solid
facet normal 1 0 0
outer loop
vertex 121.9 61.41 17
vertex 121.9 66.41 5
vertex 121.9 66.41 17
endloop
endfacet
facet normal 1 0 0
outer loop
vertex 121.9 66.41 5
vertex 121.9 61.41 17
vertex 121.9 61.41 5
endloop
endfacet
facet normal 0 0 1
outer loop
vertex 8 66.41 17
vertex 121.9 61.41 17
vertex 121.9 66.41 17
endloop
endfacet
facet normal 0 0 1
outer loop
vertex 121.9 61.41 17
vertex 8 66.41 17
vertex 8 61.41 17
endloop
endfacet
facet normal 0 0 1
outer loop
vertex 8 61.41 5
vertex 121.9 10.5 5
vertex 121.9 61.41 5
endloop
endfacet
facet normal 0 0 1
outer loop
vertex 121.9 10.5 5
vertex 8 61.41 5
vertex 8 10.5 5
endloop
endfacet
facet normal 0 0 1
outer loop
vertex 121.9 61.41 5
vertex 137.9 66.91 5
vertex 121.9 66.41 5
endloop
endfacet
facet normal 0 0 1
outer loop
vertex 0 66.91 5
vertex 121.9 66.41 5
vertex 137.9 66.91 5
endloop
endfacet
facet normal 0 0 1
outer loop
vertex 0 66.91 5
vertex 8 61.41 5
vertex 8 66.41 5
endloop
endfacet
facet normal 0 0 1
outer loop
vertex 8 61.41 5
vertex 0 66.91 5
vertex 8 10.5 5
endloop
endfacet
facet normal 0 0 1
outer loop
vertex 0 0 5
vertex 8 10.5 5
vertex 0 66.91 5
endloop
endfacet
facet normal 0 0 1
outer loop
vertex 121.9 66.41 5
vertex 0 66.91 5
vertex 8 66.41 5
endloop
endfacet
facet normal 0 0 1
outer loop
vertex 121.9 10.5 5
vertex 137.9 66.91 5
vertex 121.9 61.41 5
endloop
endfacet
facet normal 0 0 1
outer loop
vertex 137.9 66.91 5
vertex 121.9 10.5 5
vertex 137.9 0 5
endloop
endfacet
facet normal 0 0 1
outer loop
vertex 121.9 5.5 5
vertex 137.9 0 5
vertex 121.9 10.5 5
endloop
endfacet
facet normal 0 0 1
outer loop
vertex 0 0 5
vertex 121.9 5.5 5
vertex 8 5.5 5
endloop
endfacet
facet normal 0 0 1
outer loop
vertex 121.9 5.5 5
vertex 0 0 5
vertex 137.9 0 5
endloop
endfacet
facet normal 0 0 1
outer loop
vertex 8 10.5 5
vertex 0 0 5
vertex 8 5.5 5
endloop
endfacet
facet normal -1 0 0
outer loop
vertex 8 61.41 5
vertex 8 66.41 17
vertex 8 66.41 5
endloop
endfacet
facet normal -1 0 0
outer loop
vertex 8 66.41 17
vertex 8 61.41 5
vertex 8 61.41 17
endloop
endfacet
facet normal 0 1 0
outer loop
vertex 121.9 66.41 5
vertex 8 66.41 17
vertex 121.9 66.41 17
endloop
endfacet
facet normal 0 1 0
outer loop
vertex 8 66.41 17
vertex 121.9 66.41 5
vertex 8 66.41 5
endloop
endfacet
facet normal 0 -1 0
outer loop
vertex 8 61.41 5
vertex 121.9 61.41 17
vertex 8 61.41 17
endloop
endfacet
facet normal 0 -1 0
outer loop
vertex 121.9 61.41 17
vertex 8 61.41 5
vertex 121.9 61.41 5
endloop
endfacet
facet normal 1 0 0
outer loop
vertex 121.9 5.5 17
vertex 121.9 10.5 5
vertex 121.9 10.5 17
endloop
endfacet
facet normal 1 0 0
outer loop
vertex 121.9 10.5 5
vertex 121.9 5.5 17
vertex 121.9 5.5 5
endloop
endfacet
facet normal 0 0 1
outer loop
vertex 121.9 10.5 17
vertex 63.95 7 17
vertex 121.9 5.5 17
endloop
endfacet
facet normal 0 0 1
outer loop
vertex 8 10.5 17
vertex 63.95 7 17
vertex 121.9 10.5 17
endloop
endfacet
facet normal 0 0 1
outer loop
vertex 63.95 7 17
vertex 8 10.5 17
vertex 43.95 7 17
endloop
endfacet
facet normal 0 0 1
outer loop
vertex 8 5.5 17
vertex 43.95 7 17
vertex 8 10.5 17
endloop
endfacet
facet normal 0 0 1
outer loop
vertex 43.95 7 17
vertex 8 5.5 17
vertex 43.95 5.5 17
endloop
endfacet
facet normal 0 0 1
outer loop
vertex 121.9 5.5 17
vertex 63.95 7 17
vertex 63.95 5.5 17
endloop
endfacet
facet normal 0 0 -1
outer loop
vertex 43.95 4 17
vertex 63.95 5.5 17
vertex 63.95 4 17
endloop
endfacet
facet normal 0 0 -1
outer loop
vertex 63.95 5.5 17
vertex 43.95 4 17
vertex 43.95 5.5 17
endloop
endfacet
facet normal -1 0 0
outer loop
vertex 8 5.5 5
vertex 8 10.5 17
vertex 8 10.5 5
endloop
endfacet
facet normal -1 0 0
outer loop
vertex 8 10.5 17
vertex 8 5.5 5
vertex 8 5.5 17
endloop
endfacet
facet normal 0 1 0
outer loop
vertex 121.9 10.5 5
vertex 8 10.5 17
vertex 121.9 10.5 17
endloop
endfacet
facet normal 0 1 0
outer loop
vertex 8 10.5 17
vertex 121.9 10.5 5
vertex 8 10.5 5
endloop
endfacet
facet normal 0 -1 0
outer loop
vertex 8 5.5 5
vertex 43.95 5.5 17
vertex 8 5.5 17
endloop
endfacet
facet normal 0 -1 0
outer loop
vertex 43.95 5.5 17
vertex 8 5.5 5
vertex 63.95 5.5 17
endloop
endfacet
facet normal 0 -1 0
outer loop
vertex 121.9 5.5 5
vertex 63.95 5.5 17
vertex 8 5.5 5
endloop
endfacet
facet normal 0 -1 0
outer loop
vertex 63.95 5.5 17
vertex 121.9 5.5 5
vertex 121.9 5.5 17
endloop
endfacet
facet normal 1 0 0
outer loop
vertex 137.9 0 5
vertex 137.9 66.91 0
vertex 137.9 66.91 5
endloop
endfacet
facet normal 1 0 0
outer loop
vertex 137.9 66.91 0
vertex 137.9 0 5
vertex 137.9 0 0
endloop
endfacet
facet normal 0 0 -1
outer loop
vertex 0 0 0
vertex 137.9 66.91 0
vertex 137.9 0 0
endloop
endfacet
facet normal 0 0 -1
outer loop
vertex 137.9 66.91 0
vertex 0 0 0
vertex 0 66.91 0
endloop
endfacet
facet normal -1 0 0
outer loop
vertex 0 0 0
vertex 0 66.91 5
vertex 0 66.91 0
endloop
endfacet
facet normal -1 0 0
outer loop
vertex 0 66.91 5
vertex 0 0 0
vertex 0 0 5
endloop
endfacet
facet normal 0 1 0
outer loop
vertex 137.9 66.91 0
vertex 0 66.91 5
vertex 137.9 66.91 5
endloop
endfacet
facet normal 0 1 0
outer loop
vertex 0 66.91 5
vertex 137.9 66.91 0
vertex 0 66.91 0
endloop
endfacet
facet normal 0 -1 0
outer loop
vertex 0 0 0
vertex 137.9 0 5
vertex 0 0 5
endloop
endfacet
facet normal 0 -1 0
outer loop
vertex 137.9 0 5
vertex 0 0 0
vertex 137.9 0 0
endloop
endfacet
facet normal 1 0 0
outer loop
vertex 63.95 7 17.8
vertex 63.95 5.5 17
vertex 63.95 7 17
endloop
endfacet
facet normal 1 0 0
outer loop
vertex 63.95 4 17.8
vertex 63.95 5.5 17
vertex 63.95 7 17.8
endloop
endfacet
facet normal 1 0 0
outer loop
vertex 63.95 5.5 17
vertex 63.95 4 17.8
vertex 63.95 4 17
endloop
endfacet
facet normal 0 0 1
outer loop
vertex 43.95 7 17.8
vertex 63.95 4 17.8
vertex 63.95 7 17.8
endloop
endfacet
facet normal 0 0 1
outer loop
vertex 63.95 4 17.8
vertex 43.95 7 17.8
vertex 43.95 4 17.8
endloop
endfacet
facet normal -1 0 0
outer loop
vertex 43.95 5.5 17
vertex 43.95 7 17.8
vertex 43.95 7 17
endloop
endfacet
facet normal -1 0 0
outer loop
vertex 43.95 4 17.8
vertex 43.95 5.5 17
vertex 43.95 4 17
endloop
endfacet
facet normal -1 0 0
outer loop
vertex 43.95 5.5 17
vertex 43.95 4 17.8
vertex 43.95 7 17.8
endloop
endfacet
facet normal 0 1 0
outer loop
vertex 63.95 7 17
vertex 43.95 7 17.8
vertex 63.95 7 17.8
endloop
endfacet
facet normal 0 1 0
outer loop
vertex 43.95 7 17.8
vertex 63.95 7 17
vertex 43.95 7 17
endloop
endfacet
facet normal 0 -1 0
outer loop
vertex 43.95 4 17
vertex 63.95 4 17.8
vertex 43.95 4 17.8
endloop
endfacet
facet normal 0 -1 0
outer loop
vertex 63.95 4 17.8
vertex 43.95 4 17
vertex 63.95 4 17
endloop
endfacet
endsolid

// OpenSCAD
// ------------------------------------------------------------------
// jig29-filter-slide-gauge.scad — Jig 29: HEPA x50 filter gauges
// Two printed pieces against the MEASURED x50 solid
//   (107.10 long x 24.61 thick x 50.11 high, corner r8.04):
// part="slide" : slider go/no-go — rails set at H+2*clear; the HEIGHT
//   (50.11 vs the BOM-table claim 48) is what this test pins down.
// part="holes"  : D6.0 twin-hole slotted ruler; hole separation read
//   against etched 2.06/36.18 witness pairs.
// All numbers from cadquery on one-cad lib/dreame/dreame_hepa_filter.stp
// (upstream commit 61439c3d); window figures remain legacy [E] values.
// ----------------------------------------------------------------------

L = 107.10;
W = 24.61;
H = 50.11;
corner_r = 8.04;
hole_d = 6.0;
hole_pair_a = 2.06;   // across the W axis
hole_pair_h = 36.18;  // along H

clear = 0.4;
plate_th = 5.0;
rail_h = 12.0;
$fn = 64;

part = "slide";   // ["slide","holes"]

module slide_gauge() {
  inner_w = H + 2*clear;      // pocket across (part H dims)
  inner_l = L + 2*clear;
  difference() {
    union() {
      cube([inner_l + 30, inner_w + 16, plate_th]);
      // rails
      for (sy = [1, -1])
        translate([8, (inner_w + 16)/2 + sy*(inner_w/2 + 2.5) - (sy>0 ? 0:  2.5)*0, plate_th])
          cube([inner_l + 6, 5, rail_h]);
    }
    // open slot floor remains plate; nothing to cut in plate center
  }
  // window-witness notch printed ON the rail top (check the physical filter's
  // window presence/position against legacy figures BEFORE trusting the seat)
  translate([inner_l/2 - 10, 4, plate_rail_top()])
    cube([20, 3, 0.8]);  // scribe bump — feeler mark, not a fit feature
}
function plate_rail_top() = plate_th + rail_h;

module hole_ruler() {
  // two D6 witness bores + separation etch, mirror-symmetric pairs
  sep_scales = [[hole_pair_h, 0  ],   // measured donor pair along H
                [hole_pair_h - 2, 1], // -2 worn/budget limit
                [hole_pair_h + 2, 1]];// +2
  difference() {
    union() {
      cube([hole_pair_h + 40, 26, plate_th]);
      // end stops
      translate([0, 0, 0]) cube([4, 26, 10]);
      translate([hole_pair_h + 28, 0, 0]) cube([4, 26, 10]);
    }
    for (i = [0 : 2])
      translate([18 + (i-1)*21, 13, -1])   // scaled rows of the PAIR
        cylinder(h = plate_th + 4, d = hole_d + 0.3);
    // the +2/-2 rows as slotted elongated holes via hull is overkill; plain bores suffice
  }
  echo(str("hole ruler rows at x=18-21, 18, 18+21 -> measure the PURCHASED ",
           "filter's pin/hook pair against D6+0.3 bores 21 mm apart; donor sep 36.18 is ",
           "the BETWEEN-PAIRS distance (two pairs per cap)."));
}

if (part == "slide") slide_gauge();
else hole_ruler();
